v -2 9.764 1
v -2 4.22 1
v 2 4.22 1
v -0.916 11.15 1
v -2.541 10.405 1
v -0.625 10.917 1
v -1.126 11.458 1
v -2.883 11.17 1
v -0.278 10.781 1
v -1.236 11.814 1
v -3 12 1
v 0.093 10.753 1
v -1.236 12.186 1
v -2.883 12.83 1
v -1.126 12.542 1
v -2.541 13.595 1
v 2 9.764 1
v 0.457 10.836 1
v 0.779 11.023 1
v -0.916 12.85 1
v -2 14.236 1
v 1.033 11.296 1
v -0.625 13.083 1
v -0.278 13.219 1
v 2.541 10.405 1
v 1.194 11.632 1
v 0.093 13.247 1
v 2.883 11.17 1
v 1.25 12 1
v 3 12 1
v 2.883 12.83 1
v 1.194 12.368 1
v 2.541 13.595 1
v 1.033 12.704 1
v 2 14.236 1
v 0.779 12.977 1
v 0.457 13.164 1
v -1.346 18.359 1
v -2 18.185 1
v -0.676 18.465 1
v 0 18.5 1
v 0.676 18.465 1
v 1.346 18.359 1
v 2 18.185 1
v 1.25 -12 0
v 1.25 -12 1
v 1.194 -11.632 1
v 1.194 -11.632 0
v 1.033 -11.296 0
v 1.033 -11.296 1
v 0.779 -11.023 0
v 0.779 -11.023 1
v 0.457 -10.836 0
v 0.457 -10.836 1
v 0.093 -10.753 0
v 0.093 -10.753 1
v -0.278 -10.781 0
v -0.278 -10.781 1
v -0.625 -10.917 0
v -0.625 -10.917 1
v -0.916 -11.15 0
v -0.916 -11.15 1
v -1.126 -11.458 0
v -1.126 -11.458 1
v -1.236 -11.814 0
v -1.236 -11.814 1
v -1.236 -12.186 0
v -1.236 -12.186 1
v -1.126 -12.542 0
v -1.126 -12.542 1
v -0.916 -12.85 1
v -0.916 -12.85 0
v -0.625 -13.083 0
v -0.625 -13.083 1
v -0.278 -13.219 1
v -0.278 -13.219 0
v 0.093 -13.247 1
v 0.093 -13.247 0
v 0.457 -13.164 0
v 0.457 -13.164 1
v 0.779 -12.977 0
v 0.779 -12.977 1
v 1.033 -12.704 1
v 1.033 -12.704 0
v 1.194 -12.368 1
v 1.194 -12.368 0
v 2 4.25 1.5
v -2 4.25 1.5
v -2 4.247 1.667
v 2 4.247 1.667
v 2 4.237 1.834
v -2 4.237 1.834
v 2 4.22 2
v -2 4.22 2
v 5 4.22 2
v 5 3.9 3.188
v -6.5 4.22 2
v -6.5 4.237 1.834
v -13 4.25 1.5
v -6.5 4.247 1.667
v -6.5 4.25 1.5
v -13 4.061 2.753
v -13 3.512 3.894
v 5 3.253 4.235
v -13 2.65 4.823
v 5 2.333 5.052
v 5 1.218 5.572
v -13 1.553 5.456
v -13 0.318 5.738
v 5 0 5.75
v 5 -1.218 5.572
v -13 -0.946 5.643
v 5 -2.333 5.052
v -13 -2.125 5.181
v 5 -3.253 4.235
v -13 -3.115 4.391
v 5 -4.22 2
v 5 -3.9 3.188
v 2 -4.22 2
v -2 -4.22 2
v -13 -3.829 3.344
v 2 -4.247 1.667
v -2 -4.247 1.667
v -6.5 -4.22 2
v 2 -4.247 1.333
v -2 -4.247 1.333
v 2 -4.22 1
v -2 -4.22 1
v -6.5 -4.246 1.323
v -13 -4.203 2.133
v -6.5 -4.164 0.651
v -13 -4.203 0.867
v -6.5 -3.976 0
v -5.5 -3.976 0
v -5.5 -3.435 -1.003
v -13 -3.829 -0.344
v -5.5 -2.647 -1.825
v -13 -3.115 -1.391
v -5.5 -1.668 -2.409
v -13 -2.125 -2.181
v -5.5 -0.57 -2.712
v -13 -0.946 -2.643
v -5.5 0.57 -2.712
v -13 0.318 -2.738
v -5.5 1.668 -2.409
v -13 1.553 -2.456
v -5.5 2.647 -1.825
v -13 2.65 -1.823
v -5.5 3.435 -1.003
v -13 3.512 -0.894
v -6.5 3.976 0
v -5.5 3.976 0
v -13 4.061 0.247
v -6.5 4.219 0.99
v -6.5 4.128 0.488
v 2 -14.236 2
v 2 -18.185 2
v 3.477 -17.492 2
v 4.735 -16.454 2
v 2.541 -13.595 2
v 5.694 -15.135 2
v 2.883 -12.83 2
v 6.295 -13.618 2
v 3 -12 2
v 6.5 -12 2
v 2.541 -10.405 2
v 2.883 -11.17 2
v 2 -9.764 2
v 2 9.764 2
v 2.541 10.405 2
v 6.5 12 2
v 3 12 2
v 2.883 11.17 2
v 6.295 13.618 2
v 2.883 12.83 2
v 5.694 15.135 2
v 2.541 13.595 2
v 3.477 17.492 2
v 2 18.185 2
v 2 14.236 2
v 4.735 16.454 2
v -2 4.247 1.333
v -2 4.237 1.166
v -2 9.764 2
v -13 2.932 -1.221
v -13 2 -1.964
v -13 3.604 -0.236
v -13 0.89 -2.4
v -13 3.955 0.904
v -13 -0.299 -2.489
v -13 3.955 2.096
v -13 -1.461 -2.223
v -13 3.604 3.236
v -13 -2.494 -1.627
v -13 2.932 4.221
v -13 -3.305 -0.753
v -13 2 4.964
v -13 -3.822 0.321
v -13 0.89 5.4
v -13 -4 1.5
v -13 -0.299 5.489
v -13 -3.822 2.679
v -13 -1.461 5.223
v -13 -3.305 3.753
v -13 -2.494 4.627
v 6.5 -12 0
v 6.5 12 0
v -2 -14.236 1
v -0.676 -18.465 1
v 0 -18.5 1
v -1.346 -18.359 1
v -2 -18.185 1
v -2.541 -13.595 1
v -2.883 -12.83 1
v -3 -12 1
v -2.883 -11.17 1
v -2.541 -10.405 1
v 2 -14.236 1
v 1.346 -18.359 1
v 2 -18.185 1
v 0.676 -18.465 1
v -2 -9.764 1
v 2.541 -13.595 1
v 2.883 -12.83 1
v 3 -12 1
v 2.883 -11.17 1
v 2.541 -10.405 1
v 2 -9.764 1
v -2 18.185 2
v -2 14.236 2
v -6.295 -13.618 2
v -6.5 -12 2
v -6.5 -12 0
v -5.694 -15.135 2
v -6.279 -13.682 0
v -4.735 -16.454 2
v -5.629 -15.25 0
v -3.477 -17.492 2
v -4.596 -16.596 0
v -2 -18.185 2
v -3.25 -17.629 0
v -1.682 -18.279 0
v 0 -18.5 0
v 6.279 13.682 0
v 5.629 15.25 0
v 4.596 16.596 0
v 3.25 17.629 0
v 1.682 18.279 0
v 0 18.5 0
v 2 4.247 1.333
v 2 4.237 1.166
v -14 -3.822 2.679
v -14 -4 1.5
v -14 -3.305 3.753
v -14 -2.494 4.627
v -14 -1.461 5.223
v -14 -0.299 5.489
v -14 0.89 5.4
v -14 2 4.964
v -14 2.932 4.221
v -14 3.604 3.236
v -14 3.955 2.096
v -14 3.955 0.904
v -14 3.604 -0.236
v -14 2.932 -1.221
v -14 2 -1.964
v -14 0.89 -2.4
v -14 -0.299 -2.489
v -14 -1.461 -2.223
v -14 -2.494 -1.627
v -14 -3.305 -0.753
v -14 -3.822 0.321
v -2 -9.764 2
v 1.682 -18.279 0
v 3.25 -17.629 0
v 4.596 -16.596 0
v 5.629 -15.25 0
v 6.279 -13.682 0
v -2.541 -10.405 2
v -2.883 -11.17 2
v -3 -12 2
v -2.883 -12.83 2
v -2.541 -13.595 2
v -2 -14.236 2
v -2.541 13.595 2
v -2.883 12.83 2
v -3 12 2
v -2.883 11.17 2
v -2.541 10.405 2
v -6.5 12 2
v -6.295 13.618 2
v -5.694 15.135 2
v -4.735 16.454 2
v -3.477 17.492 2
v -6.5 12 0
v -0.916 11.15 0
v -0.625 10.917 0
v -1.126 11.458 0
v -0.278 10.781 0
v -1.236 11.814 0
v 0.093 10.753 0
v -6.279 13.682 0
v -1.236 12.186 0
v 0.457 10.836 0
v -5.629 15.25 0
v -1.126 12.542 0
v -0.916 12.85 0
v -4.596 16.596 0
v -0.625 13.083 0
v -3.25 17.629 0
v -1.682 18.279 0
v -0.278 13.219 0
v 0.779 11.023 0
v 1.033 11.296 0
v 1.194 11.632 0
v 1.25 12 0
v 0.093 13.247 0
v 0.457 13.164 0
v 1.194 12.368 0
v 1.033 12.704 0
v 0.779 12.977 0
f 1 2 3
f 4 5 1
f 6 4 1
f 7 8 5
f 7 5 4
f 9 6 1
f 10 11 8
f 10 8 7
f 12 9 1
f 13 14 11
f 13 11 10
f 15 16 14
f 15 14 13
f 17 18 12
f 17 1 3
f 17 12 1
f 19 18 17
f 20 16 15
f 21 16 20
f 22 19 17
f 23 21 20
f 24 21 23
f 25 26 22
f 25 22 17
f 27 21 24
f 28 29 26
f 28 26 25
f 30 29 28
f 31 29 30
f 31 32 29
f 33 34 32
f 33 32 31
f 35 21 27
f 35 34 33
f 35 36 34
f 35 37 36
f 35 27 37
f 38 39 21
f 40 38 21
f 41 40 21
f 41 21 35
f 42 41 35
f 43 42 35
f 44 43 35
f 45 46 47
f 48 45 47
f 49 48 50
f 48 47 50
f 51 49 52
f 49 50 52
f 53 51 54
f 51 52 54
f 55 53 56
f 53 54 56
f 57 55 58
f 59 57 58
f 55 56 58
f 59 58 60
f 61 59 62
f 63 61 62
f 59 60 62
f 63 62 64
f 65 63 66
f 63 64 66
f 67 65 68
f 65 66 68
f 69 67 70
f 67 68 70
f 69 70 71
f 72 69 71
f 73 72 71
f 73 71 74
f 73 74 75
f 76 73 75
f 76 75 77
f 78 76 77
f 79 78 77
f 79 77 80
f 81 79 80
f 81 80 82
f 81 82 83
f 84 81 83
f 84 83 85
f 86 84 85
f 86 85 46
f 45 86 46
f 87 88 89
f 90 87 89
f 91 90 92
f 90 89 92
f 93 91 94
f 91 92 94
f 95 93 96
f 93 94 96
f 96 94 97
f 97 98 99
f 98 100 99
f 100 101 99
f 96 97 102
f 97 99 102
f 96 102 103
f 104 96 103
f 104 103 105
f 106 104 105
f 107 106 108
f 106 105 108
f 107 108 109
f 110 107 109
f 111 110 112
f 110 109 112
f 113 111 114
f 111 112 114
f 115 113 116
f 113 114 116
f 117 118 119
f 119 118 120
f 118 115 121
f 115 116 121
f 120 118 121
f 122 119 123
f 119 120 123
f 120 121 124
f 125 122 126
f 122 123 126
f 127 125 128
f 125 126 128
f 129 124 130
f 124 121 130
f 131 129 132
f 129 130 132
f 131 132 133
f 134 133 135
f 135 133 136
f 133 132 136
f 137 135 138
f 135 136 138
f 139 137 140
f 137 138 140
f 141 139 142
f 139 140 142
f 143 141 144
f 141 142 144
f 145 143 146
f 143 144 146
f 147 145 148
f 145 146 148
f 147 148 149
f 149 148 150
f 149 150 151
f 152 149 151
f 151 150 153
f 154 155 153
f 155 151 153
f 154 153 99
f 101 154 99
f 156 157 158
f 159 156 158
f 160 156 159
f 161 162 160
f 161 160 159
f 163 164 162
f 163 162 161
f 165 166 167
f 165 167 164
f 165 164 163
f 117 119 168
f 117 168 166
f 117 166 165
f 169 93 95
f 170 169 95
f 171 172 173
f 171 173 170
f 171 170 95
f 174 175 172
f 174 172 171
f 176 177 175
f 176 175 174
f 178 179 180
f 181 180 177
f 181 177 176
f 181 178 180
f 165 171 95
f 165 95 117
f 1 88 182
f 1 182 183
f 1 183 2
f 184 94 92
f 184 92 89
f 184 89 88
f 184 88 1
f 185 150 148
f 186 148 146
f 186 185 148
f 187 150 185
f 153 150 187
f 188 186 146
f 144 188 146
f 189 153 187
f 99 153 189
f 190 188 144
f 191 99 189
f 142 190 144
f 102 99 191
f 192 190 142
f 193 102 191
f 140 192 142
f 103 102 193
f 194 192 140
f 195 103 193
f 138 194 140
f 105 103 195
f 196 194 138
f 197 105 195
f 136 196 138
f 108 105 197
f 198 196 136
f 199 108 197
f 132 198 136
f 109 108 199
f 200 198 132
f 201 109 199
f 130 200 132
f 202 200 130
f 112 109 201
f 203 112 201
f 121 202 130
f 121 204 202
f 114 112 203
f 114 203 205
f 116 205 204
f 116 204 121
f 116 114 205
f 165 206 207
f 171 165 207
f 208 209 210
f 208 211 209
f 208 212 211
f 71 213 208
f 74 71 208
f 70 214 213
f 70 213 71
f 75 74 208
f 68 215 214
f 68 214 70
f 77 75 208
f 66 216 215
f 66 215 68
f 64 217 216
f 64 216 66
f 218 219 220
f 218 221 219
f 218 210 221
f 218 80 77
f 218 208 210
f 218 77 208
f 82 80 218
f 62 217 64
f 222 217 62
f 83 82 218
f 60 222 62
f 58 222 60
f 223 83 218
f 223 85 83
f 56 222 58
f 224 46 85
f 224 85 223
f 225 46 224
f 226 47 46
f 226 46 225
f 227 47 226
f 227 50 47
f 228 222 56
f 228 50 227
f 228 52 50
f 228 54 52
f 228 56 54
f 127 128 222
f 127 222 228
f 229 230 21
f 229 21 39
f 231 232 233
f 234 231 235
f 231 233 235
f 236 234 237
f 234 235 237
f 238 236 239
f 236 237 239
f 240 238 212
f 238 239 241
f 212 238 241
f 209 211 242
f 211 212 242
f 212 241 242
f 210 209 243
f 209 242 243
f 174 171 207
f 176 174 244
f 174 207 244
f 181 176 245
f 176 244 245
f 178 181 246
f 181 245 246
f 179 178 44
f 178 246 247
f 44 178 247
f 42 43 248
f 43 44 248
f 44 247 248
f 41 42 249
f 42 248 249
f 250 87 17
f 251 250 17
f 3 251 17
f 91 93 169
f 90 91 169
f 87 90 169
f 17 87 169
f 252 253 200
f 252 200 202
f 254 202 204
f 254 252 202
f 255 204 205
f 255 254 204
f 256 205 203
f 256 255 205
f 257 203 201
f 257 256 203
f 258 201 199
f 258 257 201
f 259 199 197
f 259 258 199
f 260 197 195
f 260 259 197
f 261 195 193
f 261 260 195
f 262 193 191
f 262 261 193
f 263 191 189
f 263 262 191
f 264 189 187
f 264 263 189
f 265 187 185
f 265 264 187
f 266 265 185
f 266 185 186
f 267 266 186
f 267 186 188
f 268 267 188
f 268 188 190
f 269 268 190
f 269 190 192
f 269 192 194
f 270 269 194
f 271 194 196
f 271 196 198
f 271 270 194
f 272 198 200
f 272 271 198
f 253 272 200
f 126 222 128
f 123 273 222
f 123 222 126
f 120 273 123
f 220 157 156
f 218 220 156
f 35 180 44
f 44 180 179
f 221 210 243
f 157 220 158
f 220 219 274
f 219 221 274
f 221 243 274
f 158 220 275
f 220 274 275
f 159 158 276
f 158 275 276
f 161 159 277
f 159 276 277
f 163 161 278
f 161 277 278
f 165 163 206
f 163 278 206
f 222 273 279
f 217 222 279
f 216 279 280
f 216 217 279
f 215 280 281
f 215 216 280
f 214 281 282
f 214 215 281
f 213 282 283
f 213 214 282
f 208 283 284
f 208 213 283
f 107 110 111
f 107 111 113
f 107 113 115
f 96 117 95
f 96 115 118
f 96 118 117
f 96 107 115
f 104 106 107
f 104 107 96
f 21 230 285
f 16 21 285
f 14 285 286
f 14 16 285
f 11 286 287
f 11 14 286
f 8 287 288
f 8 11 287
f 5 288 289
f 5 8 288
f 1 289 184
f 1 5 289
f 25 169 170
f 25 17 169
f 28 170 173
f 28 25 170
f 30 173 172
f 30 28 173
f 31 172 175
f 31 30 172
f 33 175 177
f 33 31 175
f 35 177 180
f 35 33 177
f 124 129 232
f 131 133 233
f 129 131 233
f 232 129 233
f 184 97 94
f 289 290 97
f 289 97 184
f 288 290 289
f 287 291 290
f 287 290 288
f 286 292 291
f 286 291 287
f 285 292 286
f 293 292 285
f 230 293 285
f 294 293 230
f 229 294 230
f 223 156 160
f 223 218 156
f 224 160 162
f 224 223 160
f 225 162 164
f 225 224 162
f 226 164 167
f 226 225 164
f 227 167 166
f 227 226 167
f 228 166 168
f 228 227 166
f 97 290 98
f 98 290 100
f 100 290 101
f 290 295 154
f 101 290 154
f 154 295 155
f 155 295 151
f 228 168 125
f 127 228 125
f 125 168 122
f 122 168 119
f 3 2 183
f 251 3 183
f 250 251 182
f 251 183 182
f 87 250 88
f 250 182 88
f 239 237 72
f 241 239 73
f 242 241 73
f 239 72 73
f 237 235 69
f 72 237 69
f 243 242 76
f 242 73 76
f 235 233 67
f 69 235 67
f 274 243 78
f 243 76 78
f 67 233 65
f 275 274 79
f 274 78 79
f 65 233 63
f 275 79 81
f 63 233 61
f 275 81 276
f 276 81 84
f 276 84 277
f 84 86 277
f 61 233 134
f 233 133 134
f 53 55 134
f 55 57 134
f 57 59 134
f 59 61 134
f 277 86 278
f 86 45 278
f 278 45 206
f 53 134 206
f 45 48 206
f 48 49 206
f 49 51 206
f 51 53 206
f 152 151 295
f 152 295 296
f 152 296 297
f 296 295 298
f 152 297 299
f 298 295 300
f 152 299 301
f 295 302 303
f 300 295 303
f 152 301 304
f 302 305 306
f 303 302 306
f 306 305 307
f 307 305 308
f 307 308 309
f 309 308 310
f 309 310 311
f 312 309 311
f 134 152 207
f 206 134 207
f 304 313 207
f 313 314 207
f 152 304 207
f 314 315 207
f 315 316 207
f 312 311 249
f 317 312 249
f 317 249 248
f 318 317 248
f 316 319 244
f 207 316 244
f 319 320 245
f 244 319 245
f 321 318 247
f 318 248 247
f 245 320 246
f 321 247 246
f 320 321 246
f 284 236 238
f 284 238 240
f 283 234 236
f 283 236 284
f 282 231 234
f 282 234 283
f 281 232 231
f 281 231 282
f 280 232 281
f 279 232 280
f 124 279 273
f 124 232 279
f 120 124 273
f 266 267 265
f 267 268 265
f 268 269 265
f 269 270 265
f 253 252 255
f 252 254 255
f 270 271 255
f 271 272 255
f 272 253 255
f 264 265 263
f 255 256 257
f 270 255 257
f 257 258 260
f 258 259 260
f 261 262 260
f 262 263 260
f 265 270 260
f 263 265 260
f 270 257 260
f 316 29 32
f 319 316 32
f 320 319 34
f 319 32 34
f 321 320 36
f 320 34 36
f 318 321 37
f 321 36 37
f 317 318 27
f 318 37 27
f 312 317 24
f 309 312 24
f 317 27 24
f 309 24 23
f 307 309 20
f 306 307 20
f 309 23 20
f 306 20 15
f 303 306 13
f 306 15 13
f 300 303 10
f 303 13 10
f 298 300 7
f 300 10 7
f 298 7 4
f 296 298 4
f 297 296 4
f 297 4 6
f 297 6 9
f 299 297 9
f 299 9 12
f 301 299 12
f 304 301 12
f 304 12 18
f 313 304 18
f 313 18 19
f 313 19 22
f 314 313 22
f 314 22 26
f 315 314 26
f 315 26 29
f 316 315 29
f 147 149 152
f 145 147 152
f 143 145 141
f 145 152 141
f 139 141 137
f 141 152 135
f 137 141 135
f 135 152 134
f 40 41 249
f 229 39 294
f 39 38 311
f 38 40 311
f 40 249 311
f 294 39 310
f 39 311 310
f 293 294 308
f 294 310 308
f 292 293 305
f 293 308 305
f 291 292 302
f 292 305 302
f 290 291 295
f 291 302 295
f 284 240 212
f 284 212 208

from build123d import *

# Parameters (mm, degrees)
F1_DEPTH  = 2
F2_W      = 4
F2_H      = 40.789261
F3_DEPTH  = 1
F5_R      = 4.25
F6_DEPTH  = 19
F7_R      = 4.394544
F7_R_2    = 4.25
F7_R_3    = 4
F8_DEPTH  = 1
F9_W      = 12
F9_H      = 12.99651
F10_DEPTH = 25
F11_R     = 3
F12_DEPTH = 1
F13_R     = 1.25
F14_DEPTH = 3.751
F15_R     = 1.25
F16_DEPTH = 3.751


with BuildPart() as f1:
    # F0 (on Top) → F1 (new body)
    with BuildSketch(Plane.XY):
        with BuildLine():
            ThreePointArc((0, 18.5), (-4.596194, 16.596194), (-6.5, 12))
            Line((-6.5, 12), (-6.5, -12))
            ThreePointArc((-6.5, -12), (-4.596194, -16.596194), (0, -18.5))
            ThreePointArc((0, -18.5), (4.596194, -16.596194), (6.5, -12))
            Line((6.5, -12), (6.5, 12))
            ThreePointArc((6.5, 12), (4.596194, 16.596194), (0, 18.5))
        make_face()
    extrude(amount=F1_DEPTH)

    # F2 (on face) → F3 (cut)
    with BuildSketch(Plane.XY.offset(2)):
        with Locations((0, 0.259061)):
            Rectangle(F2_W, F2_H)
    extrude(amount=-F3_DEPTH, mode=Mode.SUBTRACT)

    # F5 (on offset) → F6 (join)
    with BuildSketch(Plane.YZ.offset(-14)):
        with Locations((0, 1.5)):
            Circle(F5_R)
    extrude(amount=F6_DEPTH)

    # F7 (on face) → F8 (cut)
    with BuildSketch(Plane(origin=(-14, 0, 0), x_dir=(0, -1, 0), z_dir=(-1, 0, 0))):
        with Locations((0, 1.5)):
            Circle(F7_R)
        with Locations((0, 1.5)):
            Circle(F7_R_2, mode=Mode.SUBTRACT)
        with Locations((0, 1.5)):
            Circle(F7_R_2)
        with Locations((0, 1.5)):
            Circle(F7_R_3, mode=Mode.SUBTRACT)
    extrude(amount=-F8_DEPTH, mode=Mode.SUBTRACT)

    # F9 (on face) → F10 (cut)
    with BuildSketch(Plane(origin=(0, 0, 0), x_dir=(1, 0, 0), z_dir=(0, 0, -1))):
        with Locations((0.5, -0.554225)):
            Rectangle(F9_W, F9_H)
    extrude(amount=F10_DEPTH, mode=Mode.SUBTRACT)

    # F11 (on face) → F12 (cut, through all)
    with BuildSketch(Plane.XY.offset(1)):
        with Locations((0, -12)):
            Circle(F11_R)
        with Locations((0, 12)):
            Circle(F11_R)
    extrude(amount=F12_DEPTH, mode=Mode.SUBTRACT)

    # F13 (on face) → F14 (cut, through all)
    with BuildSketch(Plane.XY.offset(1)):
        with Locations((0, -12)):
            Circle(F13_R)
    extrude(amount=-F14_DEPTH, mode=Mode.SUBTRACT)

    # F15 (on face) → F16 (cut, through all)
    with BuildSketch(Plane.XY.offset(1)):
        with Locations((0, 12)):
            Circle(F15_R)
    extrude(amount=-F16_DEPTH, mode=Mode.SUBTRACT)


solid = f1.part
